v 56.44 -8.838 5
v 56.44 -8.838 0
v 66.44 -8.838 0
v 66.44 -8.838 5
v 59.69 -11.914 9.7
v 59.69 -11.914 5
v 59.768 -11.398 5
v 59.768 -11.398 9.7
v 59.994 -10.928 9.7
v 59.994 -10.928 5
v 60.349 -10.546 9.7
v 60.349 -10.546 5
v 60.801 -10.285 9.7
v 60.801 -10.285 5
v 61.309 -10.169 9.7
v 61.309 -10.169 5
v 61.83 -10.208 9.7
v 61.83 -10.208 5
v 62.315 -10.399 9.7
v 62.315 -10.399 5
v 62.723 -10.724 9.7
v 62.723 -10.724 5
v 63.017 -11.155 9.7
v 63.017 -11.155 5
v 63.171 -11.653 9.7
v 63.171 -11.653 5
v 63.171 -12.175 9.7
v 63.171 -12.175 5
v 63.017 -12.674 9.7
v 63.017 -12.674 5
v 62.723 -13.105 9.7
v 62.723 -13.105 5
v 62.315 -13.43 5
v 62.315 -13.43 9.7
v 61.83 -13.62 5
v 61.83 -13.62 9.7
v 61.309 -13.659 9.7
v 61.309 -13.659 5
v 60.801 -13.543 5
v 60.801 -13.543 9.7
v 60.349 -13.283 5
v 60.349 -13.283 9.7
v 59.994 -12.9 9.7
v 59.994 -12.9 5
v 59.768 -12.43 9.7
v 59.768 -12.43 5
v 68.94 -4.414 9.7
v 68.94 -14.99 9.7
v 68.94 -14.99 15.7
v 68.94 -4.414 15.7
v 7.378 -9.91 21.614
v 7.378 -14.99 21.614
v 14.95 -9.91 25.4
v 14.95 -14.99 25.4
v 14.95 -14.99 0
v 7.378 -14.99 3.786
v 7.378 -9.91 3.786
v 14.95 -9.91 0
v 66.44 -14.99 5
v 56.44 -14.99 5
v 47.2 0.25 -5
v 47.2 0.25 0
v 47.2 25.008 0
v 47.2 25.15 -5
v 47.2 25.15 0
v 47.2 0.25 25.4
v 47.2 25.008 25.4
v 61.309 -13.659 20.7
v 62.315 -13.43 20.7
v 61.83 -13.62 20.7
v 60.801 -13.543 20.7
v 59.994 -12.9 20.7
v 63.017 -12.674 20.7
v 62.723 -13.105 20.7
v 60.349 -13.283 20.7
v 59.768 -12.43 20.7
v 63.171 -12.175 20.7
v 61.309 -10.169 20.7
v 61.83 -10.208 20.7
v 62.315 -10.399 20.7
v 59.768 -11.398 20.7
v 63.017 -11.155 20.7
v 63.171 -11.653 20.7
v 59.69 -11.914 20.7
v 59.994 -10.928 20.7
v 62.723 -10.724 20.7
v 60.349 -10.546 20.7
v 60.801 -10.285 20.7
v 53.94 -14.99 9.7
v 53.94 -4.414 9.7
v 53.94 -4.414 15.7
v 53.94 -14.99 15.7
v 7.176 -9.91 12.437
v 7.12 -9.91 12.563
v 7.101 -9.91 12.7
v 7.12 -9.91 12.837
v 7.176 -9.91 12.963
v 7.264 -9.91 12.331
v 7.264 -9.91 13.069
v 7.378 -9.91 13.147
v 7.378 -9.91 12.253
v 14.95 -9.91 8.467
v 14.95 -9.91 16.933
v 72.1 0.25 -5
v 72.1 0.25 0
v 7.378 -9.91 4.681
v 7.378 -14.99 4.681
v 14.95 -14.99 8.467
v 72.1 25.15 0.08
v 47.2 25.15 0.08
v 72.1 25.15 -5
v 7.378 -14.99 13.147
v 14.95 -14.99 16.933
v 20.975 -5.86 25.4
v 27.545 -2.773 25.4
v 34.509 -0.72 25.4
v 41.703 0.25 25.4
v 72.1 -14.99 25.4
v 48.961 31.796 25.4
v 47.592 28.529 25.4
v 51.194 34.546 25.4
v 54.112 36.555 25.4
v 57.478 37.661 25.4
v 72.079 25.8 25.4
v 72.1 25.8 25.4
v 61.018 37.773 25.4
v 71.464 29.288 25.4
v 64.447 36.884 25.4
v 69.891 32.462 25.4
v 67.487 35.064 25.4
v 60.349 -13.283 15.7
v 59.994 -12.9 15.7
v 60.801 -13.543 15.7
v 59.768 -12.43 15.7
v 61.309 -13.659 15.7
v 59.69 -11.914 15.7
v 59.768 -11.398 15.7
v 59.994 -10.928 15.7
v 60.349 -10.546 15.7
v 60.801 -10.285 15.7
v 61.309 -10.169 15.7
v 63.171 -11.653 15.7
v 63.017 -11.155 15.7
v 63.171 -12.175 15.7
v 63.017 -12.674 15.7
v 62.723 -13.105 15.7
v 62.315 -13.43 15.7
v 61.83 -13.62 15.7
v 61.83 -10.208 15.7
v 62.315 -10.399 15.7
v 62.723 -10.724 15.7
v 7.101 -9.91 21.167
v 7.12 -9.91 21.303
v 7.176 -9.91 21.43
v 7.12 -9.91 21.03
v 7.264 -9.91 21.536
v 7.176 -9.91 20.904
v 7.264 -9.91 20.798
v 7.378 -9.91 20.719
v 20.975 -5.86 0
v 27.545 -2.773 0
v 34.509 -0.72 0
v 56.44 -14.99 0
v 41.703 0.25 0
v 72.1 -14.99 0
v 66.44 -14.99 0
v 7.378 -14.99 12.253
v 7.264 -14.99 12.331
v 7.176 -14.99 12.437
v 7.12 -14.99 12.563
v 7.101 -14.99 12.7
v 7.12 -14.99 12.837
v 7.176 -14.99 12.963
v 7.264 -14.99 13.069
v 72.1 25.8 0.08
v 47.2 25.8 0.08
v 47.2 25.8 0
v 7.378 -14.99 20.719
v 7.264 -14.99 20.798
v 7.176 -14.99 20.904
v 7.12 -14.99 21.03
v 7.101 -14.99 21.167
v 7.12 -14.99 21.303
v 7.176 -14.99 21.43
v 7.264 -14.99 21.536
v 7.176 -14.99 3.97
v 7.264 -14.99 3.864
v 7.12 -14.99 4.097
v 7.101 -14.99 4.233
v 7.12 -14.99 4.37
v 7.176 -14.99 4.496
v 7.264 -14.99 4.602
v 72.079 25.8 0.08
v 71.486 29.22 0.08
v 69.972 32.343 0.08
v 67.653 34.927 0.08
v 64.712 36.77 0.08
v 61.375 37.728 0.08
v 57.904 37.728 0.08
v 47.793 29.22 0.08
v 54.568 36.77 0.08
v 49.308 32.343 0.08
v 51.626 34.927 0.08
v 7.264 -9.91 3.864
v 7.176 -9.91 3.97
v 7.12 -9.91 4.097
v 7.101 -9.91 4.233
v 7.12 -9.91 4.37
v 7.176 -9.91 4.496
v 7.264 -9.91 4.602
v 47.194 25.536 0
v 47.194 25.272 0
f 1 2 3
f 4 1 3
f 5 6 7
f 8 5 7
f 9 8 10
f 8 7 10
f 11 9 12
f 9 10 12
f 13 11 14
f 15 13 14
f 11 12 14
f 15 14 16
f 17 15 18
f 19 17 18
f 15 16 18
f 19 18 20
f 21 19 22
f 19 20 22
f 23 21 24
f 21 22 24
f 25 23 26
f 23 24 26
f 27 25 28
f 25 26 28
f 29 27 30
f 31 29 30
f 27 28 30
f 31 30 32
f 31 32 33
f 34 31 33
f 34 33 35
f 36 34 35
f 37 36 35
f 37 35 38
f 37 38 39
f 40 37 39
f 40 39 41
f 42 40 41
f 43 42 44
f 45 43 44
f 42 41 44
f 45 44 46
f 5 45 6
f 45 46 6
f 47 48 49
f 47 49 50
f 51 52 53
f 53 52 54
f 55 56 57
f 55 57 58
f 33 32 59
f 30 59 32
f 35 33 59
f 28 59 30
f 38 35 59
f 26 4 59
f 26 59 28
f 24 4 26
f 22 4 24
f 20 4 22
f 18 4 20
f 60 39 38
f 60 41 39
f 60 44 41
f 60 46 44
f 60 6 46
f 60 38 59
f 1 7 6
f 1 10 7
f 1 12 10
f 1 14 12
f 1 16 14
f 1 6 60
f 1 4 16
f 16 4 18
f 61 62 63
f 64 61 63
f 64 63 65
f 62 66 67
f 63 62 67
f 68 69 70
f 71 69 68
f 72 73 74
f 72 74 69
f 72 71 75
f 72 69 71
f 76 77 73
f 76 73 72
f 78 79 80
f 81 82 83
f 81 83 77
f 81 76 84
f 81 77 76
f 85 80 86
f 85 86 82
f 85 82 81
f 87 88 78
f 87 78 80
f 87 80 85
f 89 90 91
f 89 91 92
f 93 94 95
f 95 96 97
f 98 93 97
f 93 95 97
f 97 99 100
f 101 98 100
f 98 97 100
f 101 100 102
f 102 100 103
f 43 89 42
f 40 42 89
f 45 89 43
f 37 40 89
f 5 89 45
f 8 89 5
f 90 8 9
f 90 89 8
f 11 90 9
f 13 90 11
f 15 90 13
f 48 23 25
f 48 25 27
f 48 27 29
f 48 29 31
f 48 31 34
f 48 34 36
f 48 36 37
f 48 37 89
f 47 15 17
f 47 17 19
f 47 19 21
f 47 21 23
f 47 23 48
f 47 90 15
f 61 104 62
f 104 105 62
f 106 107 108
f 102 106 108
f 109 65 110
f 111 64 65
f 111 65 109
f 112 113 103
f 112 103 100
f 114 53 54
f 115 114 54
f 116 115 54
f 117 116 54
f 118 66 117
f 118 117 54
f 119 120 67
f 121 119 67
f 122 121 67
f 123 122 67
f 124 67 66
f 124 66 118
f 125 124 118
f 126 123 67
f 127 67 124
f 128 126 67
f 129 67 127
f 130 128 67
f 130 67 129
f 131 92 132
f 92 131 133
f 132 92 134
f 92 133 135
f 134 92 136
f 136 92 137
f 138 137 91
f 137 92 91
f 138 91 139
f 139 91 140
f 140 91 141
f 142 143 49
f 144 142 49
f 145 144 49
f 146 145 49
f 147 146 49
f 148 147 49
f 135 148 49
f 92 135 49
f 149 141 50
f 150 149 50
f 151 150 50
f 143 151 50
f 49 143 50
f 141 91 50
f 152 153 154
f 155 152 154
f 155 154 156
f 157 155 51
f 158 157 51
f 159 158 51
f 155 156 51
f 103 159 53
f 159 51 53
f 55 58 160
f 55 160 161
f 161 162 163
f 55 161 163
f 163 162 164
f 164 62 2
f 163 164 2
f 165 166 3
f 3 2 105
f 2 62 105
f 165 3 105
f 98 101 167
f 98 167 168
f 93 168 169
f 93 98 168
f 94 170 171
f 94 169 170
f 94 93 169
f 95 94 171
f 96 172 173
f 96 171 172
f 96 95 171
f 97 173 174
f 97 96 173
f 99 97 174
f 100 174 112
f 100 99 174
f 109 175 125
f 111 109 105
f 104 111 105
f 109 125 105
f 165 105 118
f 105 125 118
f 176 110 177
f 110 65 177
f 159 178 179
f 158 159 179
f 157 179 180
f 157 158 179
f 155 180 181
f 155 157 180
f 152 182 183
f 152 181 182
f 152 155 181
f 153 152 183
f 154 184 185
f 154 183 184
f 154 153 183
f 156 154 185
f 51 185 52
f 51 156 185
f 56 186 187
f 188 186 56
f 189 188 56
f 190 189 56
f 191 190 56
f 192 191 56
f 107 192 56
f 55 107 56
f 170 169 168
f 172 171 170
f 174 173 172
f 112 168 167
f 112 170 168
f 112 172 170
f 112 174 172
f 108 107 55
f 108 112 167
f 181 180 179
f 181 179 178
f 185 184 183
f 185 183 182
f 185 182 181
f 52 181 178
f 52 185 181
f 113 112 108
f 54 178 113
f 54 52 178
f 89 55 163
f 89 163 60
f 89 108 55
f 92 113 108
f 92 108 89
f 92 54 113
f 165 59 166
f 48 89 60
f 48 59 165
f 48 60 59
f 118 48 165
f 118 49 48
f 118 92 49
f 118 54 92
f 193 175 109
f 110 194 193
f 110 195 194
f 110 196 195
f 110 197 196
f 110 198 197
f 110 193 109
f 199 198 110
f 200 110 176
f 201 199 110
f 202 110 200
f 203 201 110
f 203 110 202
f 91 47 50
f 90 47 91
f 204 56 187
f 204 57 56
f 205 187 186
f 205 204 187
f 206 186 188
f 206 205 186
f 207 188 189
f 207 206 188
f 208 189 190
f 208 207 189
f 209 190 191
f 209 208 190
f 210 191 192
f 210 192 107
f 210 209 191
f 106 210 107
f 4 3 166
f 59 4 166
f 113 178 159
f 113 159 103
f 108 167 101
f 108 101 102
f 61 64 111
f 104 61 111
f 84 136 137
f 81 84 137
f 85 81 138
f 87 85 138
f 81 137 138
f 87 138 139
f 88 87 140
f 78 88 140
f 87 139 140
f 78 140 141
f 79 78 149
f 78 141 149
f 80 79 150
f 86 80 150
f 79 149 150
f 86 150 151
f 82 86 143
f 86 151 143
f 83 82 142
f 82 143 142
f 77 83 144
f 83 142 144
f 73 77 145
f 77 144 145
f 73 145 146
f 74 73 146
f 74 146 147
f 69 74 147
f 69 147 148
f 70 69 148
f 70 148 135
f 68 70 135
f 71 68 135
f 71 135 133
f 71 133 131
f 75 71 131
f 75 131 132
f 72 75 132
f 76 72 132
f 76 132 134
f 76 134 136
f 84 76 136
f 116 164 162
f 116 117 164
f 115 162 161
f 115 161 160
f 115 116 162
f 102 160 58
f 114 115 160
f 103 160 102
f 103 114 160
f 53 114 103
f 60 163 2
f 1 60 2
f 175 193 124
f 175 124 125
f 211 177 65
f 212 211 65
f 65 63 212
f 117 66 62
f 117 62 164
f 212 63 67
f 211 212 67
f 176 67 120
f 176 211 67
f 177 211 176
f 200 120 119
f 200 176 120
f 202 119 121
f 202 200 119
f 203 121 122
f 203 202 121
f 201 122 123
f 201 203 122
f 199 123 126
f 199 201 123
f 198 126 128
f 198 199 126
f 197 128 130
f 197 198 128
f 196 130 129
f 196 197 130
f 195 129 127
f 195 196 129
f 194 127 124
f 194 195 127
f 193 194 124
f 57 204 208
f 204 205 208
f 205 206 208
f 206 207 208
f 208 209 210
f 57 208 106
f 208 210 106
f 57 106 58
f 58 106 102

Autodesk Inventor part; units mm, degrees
ref_plane "YZ Plane" through (0, 0, 0) normal (1, 0, 0) x (0, 1, 0)
ref_plane "XZ Plane" through (0, 0, 0) normal (0, 1, 0) x (-1, 0, 0)
sketch "Sketch1" plane through (0, 0, 0) normal (0, 0, 1) x (1, 0, 0)
  line L0 (46.95, 0) -> (46.95, 38.1) projected
  line L1 (46.95, 38.1) -> (59.65, 38.1) projected
  line L2 (59.65, 38.1) -> (72.35, 38.1) projected
  line L3 (72.35, 38.1) -> (72.35, 0) projected
  circle A0 centre (61.35, -6.35) radius 12.065 projected
  line L4 (46.95, 38.1) -> (47.2, 38.1)
  line L5 (47.2, 38.1) -> (47.2, 37.85)
  line L6 (72.35, 0) -> (72.1, 0)
  line L7 (72.1, 0) -> (72.1, 0.25)
  line L8 (72.1, 0.25) -> (47.2, 0.25)
  line L9 (47.2, 0.25) -> (47.2, 37.85)
  line L10 (47.2, 37.85) -> (72.1, 37.85)
  line L11 (72.1, 37.85) -> (72.1, 0.25)
  point P0 (0, 0)
  dimension "d0" = 0.25
  dimension "d1" = 0.25
  dimension "d2" = 0.25
  dimension "d3" = 0.25
extrude "Extrusion1" add sketch "Sketch1" against normal blind 5 contours L10 L11 L8 A0 L9 | A0 L8 picked at (62.9802, 2.7077)
sketch "Sketch2" plane through (0, 0, 0) normal (0, 0, 1) x (1, 0, 0)
  line L0 (47.2, 37.85) -> (72.1, 37.85) projected
  line L1 (47.2, 37.85) -> (47.2, 12.958)
  line L2 (72.1, 37.85) -> (72.1, 0.25) projected
  circle A0 centre (59.6397, 25.404) radius 12.446
  line L3 (47.2, 0.25) -> (47.2, 37.85) projected
  line L4 (47.2, 25.7997) -> (72.1, 25.7997)
  line L5 (72.1, 25.7997) -> (72.1, 0.25)
  line L6 (72.1, 0.25) -> (47.2, 0.25)
  line L7 (47.2, 0.25) -> (47.2, 25.7997)
  point P0 (0, 0)
  dimension "d6" = 24.892
extrude "Extrusion2" add sketch "Sketch2" along normal blind 25.4 contours A0 L4 | L4 A0 L1 | L1 A0 | L4 L2 L6 L3 L1 A0
sketch "Sketch3" plane through (0, 0, 25.4) normal (0, 0, 1) x (1, 0, 0)
  circle A0 centre (61.35, -6.35) radius 12.065 projected
  circle A1 centre (61.35, -6.35) radius 6.35 projected
  line L0 (72.1, 37.85) -> (72.1, 0.25) projected
  line L1 (72.1, 0.25) -> (14.95, 0.25)
  line L2 (14.95, 0.25) -> (14.95, -14.99)
  line L3 (14.95, -14.99) -> (72.1, -14.99)
  line L4 (72.1, -14.99) -> (72.1, 0.25)
  line L5 (14.95, 0.25) -> (72.1, 0.25)
  line L6 (72.1, 0.25) -> (72.1, 10.41)
  point P0 (0, 0)
  dimension "d9" = 15.24
  dimension "d10" = 57.15
extrude "Extrusion3" add sketch "Sketch3" against normal blind 25.4 contours L4 A0 L3 L1 | A0 L1 L4 | L4 L3 A0 | A0 L3 L2 L1 | A1
sketch "Sketch5" plane through (72.1, -14.99, 0) normal (0, -1, 0) x (1, 0, 0)
  line L0 (-57.15, 25.4) -> (-57.15, 0) projected
  line L1 (-65.6167, 4.2333) -> (-57.15, 0)
  line L2 (-65.6167, 4.2333) -> (-57.15, 8.4667)
  line L3 (-65.6167, 21.1667) -> (-57.15, 25.4)
  line L4 (-65.6167, 21.1667) -> (-57.15, 16.9333)
  line L5 (-57.15, 16.9333) -> (-65.6167, 12.7)
  line L6 (-65.6167, 12.7) -> (-57.15, 8.4667)
  line L7 (0, 25.4) -> (0, 0) projected
  line L8 (-57.15, 25.4) -> (0, 25.4)
  line L9 (0, 25.4) -> (0, 0)
  line L10 (0, 0) -> (-57.15, 0)
  line L11 (0, 0) -> (-57.15, 0) projected
  line L12 (-57.15, 0) -> (-65.6167, 4.2333)
  line L13 (-65.6167, 4.2333) -> (-57.15, 8.4667)
  line L14 (-57.15, 8.4667) -> (-65.6167, 12.7)
  line L15 (-65.6167, 12.7) -> (-57.15, 16.9333)
  line L16 (-57.15, 16.9333) -> (-65.6167, 21.1667)
  line L17 (-65.6167, 21.1667) -> (-57.15, 25.4)
  point P0 (-72.1, 0)
  dimension "d16" = 8.4667
extrude "Extrusion5" add sketch "Sketch5" against normal blind 5.08
sketch "Sketch6" plane through (0, 0, 25.4) normal (0, 0, 1) x (1, 0, 0)
  line L0 (14.95, 0.25) -> (14.95, -9.91) projected
  line L1 (14.95, -9.91) -> (14.95, 0.25)
  line L2 (14.95, 0.25) -> (47.2, 0.25)
  arc A0 (47.2, 0.25) -> (14.95, -9.91) centre (44.4515, -47.2897) ccw
  point P0 (0, 0)
  point P1 (41.7029, 0.25)
extrude "Extrusion6" cut sketch "Sketch6" against normal blind 2540 contours L2 A0 L0
ref_plane "Work Plane1" through (0, 0, 12.7) normal (0, 0, 1) x (1, 0, 0)
sketch "Sketch7" plane through (0, 0, 12.7) normal (0, 0, 1) x (1, 0, 0)
  circle A0 centre (61.4402, -11.9143) radius 6.5 projected
  line L0 (61.4402, -5.4143) -> (61.4402, -4.4143)
  line L1 (61.4402, -4.4143) -> (54.9402, -4.4143)
  line L2 (54.9402, -4.4143) -> (53.9402, -4.4143)
  line L3 (53.9402, -4.4143) -> (53.9402, -14.99)
  line L4 (14.95, -14.99) -> (72.1, -14.99) projected
  line L5 (53.9402, -14.99) -> (67.9402, -14.99)
  line L6 (67.9402, -14.99) -> (68.9402, -14.99)
  line L7 (68.9402, -14.99) -> (68.9402, -4.4143)
  line L8 (68.9402, -4.4143) -> (53.9402, -4.4143)
  line L9 (53.9402, -4.4143) -> (68.9402, -4.4143)
  line L10 (68.9402, -4.4143) -> (68.9402, -14.99)
  line L11 (68.9402, -14.99) -> (53.9402, -14.99)
  line L12 (53.9402, -14.99) -> (53.9402, -4.4143)
  point P0 (0, 0)
  dimension "d27" = 1
  dimension "d28" = 1
  dimension "d29" = 1
extrude "Extrusion7" cut sketch "Sketch7" along normal mid plane 6 contours A0 L4 | A0 L0 L8 L7 L4 | A0 L4 L3 L2 L1 L0 picked at (61.4402, -11.7981)
sketch "Sketch8" plane through (0, 0, 0) normal (0, 0, -1) x (-1, 0, 0)
  circle A0 centre (-61.4402, -11.9143) radius 2 projected
  circle A1 centre (-61.4402, -11.9143) radius 1.75
  point P0 (0, 0)
  dimension "d34" = 3.5
extrude "Extrusion8" cut sketch "Sketch8" against normal blind 12.7 contours A1
sketch "Sketch9" plane through (0, 0, 0) normal (0, 0, -1) x (-1, 0, 0)
  line L0 (-53.9402, -14.99) -> (-68.9402, -14.99) projected
  line L1 (-61.4402, -14.99) -> (-66.4402, -14.99)
  line L2 (-61.4402, -14.99) -> (-56.4402, -14.99)
  line L3 (-56.4402, -14.99) -> (-56.4402, -10.1643)
  circle A0 centre (-61.4402, -11.9143) radius 1.75 projected
  line L4 (-56.4402, -11.9143) -> (-56.4402, -8.8385)
  line L5 (-56.4402, -8.8385) -> (-66.4402, -8.8385)
  line L6 (-66.4402, -8.8385) -> (-66.4402, -14.99)
  point P0 (0, 0)
  dimension "d35" = 5
  dimension "d36" = 5
  dimension "d37" = 3.0757
  dimension "d38" = 3.0757
extrude "Extrusion9" cut sketch "Sketch9" against normal blind 5
sketch "Sketch10" plane through (0, 0, 15.7) normal (0, 0, -1) x (-1, 0, 0)
  circle A0 centre (-61.4402, -11.9143) radius 2 projected
  circle A1 centre (-61.4402, -11.9143) radius 1.75 projected
  point P0 (0, 0)
extrude "Extrusion10" cut sketch "Sketch10" against normal blind 5 contours A1
fillet "Fillet1" radius 0.5 3 edges at (6.4833, -12.45, 4.2333) (6.4833, -12.45, 12.7) (6.4833, -12.45, 21.1667)
sketch "Sketch11" plane through (0, 0, -5) normal (0, 0, -1) x (-1, 0, 0)
  line L0 (-72.1, 37.85) -> (-72.1, 0.25) projected
  line L1 (-47.2, 0.25) -> (-47.2, 37.85) projected
  line L2 (-72.1, 37.85) -> (-47.2, 37.85)
  line L3 (-47.2, 37.85) -> (-47.2, 25.15)
  line L4 (-47.2, 25.15) -> (-72.1, 25.15)
  line L5 (-72.1, 25.15) -> (-72.1, 37.85)
  point P0 (0, 0)
  dimension "d44" = 12.7
extrude "Extrusion11" cut sketch "Sketch11" against normal blind 5.08
equation "\"d38\" = d37"
properties part number "Leg"
